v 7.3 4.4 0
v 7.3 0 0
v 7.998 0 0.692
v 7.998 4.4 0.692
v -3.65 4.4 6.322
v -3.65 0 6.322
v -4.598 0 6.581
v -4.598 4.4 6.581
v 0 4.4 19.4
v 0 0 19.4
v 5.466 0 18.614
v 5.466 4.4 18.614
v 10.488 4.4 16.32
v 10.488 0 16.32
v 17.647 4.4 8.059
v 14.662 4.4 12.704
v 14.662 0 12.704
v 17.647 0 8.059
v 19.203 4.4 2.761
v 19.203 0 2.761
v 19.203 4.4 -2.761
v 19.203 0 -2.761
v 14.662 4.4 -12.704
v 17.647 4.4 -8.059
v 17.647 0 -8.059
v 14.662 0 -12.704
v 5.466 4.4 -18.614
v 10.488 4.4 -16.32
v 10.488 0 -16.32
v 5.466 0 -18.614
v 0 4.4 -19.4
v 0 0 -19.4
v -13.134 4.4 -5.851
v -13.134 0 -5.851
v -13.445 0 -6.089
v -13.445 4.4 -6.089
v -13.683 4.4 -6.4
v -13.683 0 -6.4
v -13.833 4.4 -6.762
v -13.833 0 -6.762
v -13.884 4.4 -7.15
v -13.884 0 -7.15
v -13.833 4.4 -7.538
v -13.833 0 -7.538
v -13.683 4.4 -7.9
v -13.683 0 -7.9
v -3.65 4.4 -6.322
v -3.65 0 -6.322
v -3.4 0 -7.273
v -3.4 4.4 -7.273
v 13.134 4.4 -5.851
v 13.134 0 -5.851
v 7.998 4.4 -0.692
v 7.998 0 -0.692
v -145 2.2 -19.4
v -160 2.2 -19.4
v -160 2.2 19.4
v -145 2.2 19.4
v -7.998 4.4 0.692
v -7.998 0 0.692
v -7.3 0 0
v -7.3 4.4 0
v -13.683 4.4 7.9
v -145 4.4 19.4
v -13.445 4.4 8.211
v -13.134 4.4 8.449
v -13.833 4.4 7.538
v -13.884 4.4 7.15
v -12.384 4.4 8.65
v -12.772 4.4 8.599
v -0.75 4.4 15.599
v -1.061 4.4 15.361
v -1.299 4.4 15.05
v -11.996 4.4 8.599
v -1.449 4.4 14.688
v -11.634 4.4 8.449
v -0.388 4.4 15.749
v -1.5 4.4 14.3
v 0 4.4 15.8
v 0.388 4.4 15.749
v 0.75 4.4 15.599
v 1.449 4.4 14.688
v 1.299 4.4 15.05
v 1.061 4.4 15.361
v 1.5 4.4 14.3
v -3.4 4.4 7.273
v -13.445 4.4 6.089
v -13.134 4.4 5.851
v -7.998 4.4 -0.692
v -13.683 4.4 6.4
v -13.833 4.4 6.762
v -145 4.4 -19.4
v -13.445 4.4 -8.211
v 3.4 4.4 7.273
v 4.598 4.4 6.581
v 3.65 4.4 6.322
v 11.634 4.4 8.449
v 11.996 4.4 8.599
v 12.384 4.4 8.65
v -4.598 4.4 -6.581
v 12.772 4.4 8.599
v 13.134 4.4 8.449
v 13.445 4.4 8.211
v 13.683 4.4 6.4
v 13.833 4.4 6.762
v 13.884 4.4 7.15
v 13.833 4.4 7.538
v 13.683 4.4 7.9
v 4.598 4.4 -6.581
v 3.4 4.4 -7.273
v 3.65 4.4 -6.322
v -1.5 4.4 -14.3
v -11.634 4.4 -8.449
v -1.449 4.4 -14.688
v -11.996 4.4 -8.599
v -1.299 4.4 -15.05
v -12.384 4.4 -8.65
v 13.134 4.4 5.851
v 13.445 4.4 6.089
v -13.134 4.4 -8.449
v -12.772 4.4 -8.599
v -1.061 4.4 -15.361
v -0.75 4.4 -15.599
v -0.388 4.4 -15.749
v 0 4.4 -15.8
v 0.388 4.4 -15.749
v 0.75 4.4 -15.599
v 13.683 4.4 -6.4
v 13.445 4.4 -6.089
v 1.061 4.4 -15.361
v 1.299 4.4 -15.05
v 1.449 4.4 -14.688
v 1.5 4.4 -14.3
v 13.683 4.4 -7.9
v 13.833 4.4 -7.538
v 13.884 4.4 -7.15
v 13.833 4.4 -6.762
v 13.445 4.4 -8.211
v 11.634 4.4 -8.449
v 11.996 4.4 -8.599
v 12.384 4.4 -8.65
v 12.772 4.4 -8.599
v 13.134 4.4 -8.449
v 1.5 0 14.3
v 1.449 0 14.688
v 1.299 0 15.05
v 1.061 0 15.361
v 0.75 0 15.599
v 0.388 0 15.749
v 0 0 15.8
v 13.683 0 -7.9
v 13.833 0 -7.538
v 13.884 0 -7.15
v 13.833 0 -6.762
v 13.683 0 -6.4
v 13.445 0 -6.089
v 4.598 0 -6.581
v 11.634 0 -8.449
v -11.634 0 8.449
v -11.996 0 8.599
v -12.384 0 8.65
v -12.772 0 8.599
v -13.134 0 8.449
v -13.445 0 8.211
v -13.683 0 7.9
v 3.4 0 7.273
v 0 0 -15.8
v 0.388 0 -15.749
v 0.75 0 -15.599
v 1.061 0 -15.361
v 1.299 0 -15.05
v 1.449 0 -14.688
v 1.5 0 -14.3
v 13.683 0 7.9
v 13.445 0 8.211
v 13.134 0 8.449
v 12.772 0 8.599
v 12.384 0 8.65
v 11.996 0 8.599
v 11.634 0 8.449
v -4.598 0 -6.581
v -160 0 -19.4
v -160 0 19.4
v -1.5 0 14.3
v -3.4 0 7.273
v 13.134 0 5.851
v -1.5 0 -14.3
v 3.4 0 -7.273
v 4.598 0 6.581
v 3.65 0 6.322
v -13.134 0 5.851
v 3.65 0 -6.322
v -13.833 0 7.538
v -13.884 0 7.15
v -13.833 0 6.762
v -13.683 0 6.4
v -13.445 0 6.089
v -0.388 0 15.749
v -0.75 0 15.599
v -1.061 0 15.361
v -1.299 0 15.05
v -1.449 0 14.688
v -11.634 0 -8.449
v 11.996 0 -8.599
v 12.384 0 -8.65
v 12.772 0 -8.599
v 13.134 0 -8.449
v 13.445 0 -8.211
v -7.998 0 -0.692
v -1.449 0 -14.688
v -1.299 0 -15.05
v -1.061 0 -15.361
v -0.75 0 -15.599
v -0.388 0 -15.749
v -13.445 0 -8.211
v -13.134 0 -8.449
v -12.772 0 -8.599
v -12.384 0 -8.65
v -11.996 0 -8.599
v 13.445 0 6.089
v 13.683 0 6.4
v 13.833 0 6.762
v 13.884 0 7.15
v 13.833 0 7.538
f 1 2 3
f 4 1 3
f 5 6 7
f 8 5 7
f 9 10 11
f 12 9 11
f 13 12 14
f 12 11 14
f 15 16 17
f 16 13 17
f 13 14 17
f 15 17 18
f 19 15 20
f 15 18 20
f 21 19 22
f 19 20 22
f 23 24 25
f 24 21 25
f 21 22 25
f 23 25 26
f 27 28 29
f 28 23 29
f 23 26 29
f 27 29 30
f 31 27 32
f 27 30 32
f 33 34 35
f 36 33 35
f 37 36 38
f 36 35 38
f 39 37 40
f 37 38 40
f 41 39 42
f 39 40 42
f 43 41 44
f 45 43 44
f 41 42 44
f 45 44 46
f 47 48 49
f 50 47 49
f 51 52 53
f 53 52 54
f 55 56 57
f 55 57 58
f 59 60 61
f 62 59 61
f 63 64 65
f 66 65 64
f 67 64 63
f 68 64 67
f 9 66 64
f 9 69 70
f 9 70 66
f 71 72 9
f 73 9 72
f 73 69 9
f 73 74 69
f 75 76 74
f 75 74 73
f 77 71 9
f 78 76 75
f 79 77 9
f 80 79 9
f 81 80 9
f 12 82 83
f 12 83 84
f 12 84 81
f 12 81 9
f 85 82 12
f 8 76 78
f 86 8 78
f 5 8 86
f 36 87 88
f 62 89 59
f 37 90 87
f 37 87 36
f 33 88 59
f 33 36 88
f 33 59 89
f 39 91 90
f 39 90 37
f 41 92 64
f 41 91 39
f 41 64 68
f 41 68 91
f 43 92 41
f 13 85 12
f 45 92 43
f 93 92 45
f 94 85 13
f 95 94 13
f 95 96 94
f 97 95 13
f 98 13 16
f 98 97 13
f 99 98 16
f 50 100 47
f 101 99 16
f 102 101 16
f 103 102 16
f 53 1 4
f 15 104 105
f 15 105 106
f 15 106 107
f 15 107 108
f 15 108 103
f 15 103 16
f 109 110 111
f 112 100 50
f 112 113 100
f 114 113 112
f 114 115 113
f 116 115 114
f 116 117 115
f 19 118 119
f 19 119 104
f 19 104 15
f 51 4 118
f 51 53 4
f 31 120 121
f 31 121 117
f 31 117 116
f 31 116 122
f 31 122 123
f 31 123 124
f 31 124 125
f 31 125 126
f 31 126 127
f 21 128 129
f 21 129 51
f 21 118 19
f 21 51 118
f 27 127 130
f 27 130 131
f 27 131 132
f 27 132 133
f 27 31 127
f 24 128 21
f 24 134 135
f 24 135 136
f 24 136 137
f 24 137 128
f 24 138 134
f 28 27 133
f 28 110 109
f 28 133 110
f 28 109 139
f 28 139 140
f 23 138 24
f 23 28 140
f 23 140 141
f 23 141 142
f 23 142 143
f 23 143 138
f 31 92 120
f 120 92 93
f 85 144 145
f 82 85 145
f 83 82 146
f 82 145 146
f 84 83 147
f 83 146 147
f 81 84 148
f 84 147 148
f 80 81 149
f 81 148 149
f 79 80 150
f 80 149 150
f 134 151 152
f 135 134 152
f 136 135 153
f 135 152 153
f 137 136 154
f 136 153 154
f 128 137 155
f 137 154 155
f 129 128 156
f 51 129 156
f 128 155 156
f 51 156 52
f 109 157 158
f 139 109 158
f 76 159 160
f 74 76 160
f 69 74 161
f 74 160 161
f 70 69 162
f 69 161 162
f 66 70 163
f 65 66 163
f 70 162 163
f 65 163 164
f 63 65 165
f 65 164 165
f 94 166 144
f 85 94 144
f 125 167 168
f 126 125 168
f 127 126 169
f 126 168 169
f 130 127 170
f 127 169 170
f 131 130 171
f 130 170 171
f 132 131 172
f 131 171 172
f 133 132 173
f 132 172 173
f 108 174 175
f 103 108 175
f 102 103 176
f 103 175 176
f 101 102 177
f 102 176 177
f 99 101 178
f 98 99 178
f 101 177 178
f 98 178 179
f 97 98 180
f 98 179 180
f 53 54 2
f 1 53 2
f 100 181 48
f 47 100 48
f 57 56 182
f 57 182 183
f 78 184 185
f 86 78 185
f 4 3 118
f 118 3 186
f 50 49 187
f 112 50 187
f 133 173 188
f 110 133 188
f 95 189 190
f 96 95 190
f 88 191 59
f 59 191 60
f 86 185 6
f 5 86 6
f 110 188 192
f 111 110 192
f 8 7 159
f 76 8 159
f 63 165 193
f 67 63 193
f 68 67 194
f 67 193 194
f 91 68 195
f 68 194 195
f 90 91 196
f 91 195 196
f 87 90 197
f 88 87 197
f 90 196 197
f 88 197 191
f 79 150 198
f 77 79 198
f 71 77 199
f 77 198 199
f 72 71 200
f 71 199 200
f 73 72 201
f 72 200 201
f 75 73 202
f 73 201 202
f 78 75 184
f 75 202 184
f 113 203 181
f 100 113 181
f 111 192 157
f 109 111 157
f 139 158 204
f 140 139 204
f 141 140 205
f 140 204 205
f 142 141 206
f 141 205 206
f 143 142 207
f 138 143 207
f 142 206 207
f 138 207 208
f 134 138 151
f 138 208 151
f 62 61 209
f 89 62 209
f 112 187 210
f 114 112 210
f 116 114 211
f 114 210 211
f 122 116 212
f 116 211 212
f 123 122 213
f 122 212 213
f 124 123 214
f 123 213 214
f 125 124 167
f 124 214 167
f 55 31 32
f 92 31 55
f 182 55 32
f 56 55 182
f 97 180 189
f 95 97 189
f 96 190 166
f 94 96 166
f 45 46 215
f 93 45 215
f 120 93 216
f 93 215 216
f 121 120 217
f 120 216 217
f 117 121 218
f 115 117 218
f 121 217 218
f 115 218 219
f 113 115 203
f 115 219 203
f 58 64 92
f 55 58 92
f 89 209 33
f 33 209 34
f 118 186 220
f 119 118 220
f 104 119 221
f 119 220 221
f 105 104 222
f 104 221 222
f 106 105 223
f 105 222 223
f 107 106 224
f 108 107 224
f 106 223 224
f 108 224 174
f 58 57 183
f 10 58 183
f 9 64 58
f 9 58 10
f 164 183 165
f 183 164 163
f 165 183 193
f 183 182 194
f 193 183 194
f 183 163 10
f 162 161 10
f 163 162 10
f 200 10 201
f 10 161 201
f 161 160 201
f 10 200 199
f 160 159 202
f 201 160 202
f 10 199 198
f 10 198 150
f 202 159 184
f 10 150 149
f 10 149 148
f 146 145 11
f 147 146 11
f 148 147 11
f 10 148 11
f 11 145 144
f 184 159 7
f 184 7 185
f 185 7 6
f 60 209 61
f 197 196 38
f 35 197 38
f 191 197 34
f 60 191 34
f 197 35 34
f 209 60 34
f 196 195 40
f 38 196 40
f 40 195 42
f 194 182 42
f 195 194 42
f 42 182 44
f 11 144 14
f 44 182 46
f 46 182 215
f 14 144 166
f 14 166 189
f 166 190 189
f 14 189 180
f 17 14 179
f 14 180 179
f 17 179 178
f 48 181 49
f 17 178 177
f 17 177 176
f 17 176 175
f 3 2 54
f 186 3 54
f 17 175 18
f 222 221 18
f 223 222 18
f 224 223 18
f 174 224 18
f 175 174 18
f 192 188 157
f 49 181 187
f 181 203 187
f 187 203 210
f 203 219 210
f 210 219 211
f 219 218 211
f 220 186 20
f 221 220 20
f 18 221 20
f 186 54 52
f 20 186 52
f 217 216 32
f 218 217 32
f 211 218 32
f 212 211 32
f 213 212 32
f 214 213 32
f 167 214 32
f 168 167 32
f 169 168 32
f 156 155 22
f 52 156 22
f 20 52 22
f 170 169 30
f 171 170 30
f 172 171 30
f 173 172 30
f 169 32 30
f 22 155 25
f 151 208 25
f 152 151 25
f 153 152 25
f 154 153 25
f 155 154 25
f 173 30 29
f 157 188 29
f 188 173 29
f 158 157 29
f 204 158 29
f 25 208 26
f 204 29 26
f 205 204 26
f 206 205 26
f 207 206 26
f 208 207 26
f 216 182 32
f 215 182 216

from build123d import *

# Parameters (mm, degrees)
SKETCH_1_R          = 15.8
EXTRUDE_1_DEPTH     = 4.4
CUT_EXTRUDE_2_DEPTH = 4.4
SKETCH_4_R          = 19.4
SKETCH_4_R_2        = 15.8
EXTRUDE_2_DEPTH     = 4.4
EXTRUDE_3_DEPTH     = 4.4
SKETCH_6_W          = 15
SKETCH_6_H          = 38.8
CUT_EXTRUDE_3_DEPTH = 2.2


with BuildPart() as part:
    # 草圖1 → 填料-伸長1 (new body)
    with BuildSketch(Plane(origin=(0, 0, 0), x_dir=(1, 0, 0), z_dir=(0, 1, 0))):
        Circle(SKETCH_1_R)
    extrude(amount=EXTRUDE_1_DEPTH)

    # 草圖3 → 除料-伸長2 (cut)
    with BuildSketch(Plane.XZ):
        with BuildLine():
            Line((-1.5, 14.3), (-3.4, 7.272575881))
            Line((-3.4, 7.272575881), (-3.650072203, 6.322110506))
            Line((-3.650072203, 6.322110506), (-4.598235464, 6.580774314))
            Line((-4.598235464, 6.580774314), (-11.634163274, 8.449038106))
            ThreePointArc((-11.634163274, 8.449038106), (-12.772391842, 8.598888739), (-13.68320138, 7.9))
            ThreePointArc((-13.68320138, 7.9), (-13.833052014, 6.761771432), (-13.134163274, 5.850961894))
            Line((-13.134163274, 5.850961894), (-7.998235464, 0.691801568))
            Line((-7.998235464, 0.691801568), (-7.300144405, 0))
            Line((-7.300144405, 0), (-7.998235464, -0.691801568))
            Line((-7.998235464, -0.691801568), (-13.134163274, -5.850961894))
            ThreePointArc((-13.134163274, -5.850961894), (-13.833052014, -6.761771432), (-13.68320138, -7.9))
            ThreePointArc((-13.68320138, -7.9), (-12.772391842, -8.598888739), (-11.634163274, -8.449038106))
            Line((-11.634163274, -8.449038106), (-4.598235464, -6.580774314))
            Line((-4.598235464, -6.580774314), (-3.650072203, -6.322110506))
            Line((-3.650072203, -6.322110506), (-3.4, -7.272575881))
            Line((-3.4, -7.272575881), (-1.5, -14.3))
            ThreePointArc((-1.5, -14.3), (-1.060660172, -15.360660172), (0, -15.8))
            ThreePointArc((0, -15.8), (1.060660172, -15.360660172), (1.5, -14.3))
            Line((1.5, -14.3), (3.4, -7.272575881))
            Line((3.4, -7.272575881), (3.650072203, -6.322110506))
            Line((3.650072203, -6.322110506), (4.598235464, -6.580774314))
            Line((4.598235464, -6.580774314), (11.634163274, -8.449038106))
            ThreePointArc((11.634163274, -8.449038106), (12.772391842, -8.598888739), (13.68320138, -7.9))
            ThreePointArc((13.68320138, -7.9), (13.833052014, -6.761771432), (13.134163274, -5.850961894))
            Line((13.134163274, -5.850961894), (7.998235464, -0.691801568))
            Line((7.998235464, -0.691801568), (7.300144405, 0))
            Line((7.300144405, 0), (7.998235464, 0.691801568))
            Line((7.998235464, 0.691801568), (13.134163274, 5.850961894))
            ThreePointArc((13.134163274, 5.850961894), (13.833052014, 6.761771432), (13.68320138, 7.9))
            ThreePointArc((13.68320138, 7.9), (12.772391842, 8.598888739), (11.634163274, 8.449038106))
            Line((11.634163274, 8.449038106), (4.598235464, 6.580774314))
            Line((4.598235464, 6.580774314), (3.650072203, 6.322110506))
            Line((3.650072203, 6.322110506), (3.4, 7.272575881))
            Line((3.4, 7.272575881), (1.5, 14.3))
            ThreePointArc((1.5, 14.3), (1.060660172, 15.360660172), (0, 15.8))
            ThreePointArc((0, 15.8), (-1.060660172, 15.360660172), (-1.5, 14.3))
        make_face()
    extrude(amount=-CUT_EXTRUDE_2_DEPTH, mode=Mode.SUBTRACT)

    # 草圖4 → 填料-伸長2 (add)
    with BuildSketch(Plane(origin=(0, 0, 0), x_dir=(1, 0, 0), z_dir=(0, 1, 0))):
        Circle(SKETCH_4_R)
        Circle(SKETCH_4_R_2, mode=Mode.SUBTRACT)
    extrude(amount=EXTRUDE_2_DEPTH)

    # 草圖5 → 填料-伸長3 (add)
    with BuildSketch(Plane(origin=(0, 4.4, 0), x_dir=(1, 0, 0), z_dir=(0, 1, 0))):
        with BuildLine():
            Line((0, 19.4), (-160, 19.4))
            Line((-160, 19.4), (-160, -19.4))
            Line((-160, -19.4), (0, -19.4))
            ThreePointArc((0, -19.4), (-19.4, 0), (0, 19.4))
        make_face()
    extrude(amount=-EXTRUDE_3_DEPTH)

    # 草圖6 → 除料-伸長3 (cut)
    with BuildSketch(Plane(origin=(0, 4.4, 0), x_dir=(1, 0, 0), z_dir=(0, 1, 0))):
        with Locations((-152.5, 0)):
            Rectangle(SKETCH_6_W, SKETCH_6_H)
    extrude(amount=-CUT_EXTRUDE_3_DEPTH, mode=Mode.SUBTRACT)


solid = part.part
